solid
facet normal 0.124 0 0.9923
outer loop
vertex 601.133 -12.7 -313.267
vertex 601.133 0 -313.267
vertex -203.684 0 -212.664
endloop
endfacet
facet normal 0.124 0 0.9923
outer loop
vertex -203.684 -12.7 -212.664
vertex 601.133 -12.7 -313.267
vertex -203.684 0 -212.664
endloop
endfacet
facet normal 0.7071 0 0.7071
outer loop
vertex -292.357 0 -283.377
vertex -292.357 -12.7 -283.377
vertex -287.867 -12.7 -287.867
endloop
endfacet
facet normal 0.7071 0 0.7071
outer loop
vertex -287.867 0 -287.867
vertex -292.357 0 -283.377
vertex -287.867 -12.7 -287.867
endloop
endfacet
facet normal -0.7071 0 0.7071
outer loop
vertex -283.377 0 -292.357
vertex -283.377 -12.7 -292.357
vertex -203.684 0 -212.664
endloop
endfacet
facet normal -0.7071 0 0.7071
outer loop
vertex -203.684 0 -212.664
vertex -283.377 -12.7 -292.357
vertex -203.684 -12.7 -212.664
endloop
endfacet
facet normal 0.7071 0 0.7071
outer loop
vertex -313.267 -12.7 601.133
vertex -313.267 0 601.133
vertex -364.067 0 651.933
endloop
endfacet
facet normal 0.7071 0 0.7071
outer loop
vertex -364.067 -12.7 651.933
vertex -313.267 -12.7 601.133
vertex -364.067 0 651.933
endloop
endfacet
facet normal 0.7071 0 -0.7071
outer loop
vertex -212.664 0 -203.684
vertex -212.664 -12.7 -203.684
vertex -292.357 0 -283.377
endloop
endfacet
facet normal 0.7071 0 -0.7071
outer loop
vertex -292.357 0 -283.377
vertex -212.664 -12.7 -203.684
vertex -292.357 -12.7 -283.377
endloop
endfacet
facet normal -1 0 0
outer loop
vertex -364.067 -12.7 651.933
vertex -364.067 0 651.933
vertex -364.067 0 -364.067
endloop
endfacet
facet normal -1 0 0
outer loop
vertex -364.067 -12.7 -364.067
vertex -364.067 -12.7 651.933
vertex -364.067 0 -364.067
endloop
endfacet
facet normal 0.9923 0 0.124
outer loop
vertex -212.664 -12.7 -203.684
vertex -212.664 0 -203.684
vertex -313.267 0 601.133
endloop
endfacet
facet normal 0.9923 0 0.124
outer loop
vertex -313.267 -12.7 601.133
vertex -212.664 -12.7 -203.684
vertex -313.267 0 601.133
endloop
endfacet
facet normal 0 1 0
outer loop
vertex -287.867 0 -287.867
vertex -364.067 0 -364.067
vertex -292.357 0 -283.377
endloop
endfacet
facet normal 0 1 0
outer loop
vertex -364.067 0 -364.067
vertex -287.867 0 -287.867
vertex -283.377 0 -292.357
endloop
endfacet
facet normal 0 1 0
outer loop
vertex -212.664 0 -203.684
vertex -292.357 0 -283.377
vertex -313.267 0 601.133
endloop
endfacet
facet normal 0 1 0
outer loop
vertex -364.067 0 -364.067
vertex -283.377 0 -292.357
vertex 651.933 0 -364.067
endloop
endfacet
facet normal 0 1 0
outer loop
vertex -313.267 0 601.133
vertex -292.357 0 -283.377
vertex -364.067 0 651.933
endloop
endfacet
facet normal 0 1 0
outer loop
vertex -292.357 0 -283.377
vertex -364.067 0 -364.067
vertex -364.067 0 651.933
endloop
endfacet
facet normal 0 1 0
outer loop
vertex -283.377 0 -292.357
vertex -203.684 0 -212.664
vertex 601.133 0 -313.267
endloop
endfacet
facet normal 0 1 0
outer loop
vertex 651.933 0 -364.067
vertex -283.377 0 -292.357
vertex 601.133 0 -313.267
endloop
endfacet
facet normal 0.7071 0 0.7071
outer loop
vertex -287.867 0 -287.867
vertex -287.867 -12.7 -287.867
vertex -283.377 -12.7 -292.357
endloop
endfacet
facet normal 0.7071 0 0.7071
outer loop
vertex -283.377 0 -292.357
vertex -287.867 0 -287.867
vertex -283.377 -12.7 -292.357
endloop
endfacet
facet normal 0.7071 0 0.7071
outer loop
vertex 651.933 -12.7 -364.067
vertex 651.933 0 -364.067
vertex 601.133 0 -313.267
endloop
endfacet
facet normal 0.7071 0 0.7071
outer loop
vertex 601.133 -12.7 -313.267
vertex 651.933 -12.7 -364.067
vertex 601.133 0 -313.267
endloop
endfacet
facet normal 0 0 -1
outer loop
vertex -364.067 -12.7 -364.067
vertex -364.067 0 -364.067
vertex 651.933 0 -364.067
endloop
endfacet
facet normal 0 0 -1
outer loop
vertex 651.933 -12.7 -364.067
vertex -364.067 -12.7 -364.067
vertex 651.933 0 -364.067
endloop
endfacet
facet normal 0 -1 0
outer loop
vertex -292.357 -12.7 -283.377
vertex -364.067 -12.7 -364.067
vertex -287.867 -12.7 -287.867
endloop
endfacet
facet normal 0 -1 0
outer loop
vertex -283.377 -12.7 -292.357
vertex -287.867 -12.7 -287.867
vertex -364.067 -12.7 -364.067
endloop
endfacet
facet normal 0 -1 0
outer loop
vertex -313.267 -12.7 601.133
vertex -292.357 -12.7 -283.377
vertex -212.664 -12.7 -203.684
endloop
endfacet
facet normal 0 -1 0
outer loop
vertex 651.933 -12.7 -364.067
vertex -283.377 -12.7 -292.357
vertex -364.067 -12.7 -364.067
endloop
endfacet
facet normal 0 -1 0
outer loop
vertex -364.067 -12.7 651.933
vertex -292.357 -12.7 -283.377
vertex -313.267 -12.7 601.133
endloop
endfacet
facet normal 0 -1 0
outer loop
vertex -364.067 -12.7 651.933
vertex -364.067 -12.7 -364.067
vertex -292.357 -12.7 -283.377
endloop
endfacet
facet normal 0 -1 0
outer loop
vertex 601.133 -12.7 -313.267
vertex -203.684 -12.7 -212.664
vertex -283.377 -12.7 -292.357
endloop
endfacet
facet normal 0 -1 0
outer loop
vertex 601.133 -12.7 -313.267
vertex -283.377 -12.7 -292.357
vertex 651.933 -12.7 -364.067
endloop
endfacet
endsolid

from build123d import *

# Parameters (mm, degrees)
F1_DEPTH = 12.7
F3_DEPTH = 25.4


# Not quite as in the source:
# - a length typed as a fraction of an inch, garbled in the dataset ("3 / 203.2 mm" for 3/8 in), is restored


with BuildPart() as f1:
    # F0 (on Front) → F1 (new body)
    with BuildSketch(Plane.XZ):
        Polygon((-313.2666666667, 601.1333333333), (-364.0666666667, 651.9333333333), (-364.0666666667, -364.0666666667), (651.9333333333, -364.0666666667), (601.1333333333, -313.2666666667), (-211.6666666667, -211.6666666667), align=None)
    extrude(amount=F1_DEPTH)

    # F2 (on face) → F3 (cut)
    with BuildSketch(Plane.XZ.offset(12.7)):
        Polygon((-292.3567947272, -283.3765386061), (-287.8666666667, -287.8666666667), (-283.3765386061, -292.3567947272), (-203.6842167813, -212.6644729023), (-212.6644729023, -203.6842167813), align=None)
    extrude(amount=-F3_DEPTH, mode=Mode.SUBTRACT)


solid = f1.part
